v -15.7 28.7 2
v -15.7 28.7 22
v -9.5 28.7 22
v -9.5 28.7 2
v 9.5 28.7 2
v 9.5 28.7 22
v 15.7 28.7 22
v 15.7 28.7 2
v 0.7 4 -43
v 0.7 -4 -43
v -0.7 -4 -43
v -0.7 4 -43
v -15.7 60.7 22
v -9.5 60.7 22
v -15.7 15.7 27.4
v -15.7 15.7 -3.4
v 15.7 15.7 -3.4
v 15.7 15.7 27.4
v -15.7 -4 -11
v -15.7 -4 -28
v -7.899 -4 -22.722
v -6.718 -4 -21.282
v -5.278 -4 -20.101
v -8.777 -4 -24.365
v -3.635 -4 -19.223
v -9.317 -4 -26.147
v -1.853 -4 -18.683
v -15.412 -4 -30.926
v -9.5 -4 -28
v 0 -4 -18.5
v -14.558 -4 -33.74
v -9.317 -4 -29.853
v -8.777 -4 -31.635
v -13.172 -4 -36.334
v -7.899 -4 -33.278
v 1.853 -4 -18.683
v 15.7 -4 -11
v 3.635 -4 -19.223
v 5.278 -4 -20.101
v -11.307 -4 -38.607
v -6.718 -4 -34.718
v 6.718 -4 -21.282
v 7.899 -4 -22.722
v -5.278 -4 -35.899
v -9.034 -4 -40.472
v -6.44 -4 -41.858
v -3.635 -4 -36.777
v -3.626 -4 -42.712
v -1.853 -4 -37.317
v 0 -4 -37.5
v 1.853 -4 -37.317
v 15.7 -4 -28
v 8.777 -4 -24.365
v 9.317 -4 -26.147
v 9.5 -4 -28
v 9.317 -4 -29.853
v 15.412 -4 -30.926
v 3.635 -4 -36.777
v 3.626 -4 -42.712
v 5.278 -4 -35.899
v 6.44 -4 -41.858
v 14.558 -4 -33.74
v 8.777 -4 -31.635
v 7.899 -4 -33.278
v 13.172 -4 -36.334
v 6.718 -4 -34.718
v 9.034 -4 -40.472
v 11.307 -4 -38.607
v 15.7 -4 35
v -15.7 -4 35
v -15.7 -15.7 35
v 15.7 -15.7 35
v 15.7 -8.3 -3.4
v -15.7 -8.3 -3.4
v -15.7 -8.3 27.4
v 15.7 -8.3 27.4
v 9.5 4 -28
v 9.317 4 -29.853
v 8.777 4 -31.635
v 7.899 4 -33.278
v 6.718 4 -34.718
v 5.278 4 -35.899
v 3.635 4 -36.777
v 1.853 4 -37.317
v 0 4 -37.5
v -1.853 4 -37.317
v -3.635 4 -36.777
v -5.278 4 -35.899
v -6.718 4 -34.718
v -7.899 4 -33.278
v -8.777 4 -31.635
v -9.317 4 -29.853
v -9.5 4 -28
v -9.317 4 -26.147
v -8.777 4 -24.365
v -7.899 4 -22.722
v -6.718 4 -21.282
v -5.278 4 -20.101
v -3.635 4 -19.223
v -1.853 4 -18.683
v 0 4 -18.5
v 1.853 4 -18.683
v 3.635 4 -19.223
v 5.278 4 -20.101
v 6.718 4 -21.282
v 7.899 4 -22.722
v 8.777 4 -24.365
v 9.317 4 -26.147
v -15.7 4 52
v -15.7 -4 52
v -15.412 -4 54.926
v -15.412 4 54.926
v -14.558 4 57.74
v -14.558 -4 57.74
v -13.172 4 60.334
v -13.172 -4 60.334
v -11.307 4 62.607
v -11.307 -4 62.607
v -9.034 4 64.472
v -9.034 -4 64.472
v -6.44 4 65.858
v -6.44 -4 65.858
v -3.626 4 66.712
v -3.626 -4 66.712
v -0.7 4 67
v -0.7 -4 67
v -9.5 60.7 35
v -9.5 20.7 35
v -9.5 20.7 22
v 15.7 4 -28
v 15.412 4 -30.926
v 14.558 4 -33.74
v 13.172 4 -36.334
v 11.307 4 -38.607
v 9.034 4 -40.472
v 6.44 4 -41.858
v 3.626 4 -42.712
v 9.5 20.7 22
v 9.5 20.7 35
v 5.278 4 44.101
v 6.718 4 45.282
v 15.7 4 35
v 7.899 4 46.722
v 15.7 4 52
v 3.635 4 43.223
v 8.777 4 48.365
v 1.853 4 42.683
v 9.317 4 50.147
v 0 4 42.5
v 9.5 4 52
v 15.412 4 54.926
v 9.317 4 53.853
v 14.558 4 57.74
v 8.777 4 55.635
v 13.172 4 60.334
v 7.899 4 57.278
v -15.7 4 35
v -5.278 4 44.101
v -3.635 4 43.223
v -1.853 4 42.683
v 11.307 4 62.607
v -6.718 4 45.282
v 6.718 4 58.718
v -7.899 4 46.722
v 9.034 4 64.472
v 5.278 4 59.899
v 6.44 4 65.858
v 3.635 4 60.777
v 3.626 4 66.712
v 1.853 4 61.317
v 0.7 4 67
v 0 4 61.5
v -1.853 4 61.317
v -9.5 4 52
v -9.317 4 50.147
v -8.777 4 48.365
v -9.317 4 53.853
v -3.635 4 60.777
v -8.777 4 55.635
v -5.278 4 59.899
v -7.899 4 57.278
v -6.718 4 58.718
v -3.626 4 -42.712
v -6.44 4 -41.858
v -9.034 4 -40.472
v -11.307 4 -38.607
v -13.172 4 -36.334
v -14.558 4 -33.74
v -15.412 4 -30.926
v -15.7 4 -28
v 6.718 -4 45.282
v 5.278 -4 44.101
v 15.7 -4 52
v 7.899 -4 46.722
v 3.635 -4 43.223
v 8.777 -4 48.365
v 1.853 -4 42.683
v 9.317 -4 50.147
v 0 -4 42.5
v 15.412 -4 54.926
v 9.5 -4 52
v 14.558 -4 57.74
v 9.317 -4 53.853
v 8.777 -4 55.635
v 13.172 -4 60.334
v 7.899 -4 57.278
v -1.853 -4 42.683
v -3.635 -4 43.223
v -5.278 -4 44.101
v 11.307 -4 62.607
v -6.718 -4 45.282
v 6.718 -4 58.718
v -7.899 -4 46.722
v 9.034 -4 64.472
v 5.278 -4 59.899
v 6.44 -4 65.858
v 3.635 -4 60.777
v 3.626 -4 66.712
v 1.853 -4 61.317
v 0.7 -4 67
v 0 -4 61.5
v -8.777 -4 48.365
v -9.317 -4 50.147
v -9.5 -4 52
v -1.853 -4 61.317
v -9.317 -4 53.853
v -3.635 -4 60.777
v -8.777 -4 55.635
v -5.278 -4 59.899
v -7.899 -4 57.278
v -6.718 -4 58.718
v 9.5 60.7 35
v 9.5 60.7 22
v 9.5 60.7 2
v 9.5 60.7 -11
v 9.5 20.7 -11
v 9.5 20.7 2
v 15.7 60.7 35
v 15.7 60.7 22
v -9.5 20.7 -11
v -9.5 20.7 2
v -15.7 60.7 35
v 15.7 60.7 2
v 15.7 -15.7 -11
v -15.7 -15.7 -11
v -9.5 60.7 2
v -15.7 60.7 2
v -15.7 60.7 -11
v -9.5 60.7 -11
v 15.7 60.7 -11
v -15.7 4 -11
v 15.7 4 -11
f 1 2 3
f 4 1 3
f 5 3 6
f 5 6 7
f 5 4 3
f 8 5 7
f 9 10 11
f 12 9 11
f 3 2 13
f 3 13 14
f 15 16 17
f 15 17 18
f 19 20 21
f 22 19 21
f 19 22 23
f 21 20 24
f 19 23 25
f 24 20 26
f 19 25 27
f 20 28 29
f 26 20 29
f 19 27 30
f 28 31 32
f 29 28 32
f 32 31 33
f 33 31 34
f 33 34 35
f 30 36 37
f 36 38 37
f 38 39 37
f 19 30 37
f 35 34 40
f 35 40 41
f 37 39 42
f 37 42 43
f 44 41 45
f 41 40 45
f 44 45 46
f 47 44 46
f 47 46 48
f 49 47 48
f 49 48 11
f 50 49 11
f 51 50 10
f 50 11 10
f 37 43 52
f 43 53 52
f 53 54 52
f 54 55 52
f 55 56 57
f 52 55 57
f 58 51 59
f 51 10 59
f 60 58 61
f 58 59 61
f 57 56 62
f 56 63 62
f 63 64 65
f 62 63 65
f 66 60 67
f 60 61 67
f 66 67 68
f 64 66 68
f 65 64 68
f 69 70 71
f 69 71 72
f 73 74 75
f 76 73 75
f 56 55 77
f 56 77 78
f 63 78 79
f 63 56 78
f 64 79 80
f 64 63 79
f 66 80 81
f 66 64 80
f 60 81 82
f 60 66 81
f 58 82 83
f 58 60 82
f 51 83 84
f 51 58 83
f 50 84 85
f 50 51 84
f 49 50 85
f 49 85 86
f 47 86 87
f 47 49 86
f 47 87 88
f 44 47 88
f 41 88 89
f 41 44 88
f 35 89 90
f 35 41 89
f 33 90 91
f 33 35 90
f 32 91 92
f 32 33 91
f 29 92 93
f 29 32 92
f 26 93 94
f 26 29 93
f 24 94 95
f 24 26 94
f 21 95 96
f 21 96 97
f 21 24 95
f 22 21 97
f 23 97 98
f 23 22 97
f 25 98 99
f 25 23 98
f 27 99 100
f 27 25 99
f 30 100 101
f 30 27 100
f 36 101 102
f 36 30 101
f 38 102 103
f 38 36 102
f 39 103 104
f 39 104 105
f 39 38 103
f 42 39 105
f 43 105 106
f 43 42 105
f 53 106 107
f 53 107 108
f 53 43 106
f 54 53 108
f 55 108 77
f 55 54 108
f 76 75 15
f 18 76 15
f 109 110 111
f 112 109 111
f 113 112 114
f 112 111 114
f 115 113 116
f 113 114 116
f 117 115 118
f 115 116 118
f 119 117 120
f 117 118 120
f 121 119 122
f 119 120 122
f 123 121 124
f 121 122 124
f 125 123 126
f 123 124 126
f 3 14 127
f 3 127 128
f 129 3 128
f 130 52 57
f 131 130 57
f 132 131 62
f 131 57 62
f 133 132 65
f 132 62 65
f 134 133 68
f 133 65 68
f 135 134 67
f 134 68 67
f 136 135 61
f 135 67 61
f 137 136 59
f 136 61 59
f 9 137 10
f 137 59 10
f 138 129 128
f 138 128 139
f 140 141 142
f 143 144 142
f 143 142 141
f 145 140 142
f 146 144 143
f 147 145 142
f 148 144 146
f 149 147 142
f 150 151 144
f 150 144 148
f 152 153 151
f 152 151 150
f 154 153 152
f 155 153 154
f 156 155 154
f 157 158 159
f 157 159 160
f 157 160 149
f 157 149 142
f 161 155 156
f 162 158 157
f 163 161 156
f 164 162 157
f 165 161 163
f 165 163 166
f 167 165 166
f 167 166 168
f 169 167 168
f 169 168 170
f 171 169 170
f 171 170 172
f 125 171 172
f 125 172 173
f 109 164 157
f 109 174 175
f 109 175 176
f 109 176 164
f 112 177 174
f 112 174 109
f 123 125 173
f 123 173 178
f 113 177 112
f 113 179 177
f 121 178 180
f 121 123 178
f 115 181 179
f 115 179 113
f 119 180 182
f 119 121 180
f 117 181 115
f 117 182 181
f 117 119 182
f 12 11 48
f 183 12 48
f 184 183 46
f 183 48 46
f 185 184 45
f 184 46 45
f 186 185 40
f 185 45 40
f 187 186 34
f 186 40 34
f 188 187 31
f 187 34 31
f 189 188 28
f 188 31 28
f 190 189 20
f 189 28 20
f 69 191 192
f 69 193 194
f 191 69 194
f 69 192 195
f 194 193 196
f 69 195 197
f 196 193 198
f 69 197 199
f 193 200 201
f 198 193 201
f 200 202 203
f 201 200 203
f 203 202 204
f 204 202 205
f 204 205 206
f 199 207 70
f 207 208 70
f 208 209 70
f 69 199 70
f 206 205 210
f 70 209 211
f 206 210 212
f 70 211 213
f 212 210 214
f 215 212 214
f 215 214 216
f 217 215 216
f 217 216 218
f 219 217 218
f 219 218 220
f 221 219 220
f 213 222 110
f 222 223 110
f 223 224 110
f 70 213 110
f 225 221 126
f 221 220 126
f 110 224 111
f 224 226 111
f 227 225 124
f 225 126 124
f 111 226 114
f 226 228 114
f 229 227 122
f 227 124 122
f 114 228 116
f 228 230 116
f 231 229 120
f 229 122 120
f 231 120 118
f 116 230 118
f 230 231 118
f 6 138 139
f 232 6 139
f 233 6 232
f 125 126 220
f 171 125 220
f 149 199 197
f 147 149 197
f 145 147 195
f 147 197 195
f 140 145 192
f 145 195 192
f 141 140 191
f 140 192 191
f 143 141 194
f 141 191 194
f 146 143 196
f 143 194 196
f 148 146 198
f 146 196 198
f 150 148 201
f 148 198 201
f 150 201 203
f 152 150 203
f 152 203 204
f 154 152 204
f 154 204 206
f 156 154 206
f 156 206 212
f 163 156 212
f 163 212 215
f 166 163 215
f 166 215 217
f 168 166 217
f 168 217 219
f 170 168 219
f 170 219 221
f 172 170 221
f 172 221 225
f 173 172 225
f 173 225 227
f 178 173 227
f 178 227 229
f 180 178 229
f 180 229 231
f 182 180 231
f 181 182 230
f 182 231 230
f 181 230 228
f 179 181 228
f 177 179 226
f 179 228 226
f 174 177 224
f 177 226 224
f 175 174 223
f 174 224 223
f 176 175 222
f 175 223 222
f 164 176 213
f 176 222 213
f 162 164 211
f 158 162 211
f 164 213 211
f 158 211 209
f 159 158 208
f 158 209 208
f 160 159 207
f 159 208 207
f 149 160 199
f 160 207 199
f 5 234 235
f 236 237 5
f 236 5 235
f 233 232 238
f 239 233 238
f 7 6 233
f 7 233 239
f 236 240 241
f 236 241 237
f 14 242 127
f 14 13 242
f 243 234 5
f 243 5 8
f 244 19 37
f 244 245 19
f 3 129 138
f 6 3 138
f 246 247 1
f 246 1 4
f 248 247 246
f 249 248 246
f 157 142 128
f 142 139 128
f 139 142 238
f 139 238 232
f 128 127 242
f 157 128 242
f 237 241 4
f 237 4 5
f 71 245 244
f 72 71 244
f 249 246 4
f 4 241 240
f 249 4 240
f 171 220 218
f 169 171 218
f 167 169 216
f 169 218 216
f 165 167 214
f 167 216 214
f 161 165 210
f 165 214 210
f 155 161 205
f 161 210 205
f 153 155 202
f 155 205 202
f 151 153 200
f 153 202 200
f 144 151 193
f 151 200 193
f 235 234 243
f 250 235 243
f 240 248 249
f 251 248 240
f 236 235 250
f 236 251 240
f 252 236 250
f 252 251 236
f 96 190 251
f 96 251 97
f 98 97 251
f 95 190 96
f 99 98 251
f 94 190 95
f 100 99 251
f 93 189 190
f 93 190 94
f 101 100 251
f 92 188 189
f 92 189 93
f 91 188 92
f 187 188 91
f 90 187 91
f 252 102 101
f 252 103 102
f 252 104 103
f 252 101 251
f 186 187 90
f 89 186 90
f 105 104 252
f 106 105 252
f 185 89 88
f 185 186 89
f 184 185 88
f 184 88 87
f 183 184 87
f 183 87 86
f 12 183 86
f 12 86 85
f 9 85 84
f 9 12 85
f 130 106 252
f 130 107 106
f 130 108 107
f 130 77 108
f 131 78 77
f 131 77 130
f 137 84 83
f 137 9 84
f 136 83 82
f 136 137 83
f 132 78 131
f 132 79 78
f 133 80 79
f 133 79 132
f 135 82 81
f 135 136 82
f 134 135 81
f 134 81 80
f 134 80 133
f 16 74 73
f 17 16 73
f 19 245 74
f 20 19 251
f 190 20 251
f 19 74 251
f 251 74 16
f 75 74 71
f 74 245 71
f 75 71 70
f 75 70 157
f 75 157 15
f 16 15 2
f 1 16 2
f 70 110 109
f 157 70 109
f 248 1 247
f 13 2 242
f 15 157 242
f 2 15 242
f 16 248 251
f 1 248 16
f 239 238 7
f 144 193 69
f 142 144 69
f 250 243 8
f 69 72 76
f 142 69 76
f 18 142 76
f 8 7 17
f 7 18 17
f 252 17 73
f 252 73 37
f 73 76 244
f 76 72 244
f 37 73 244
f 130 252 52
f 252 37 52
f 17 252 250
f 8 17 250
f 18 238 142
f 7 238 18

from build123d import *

# Parameters (mm, degrees)
SKETCH4_W             = 31.4
SKETCH4_H             = 31.4
SKETCH4_W_2           = 25.4
SKETCH4_H_2           = 25.4
BOSS_EXTRUDE3_DEPTH   = 30
SKETCH5_W             = 31.4
SKETCH5_H             = 31.4
BOSS_EXTRUDE4_DEPTH   = 5
SKETCH6_W             = 31.4
SKETCH6_H             = 8
BOSS_EXTRUDE5_DEPTH   = 5
BOSS_EXTRUDE6_DEPTH   = 8
SKETCH8_R             = 9.5
BOSS_EXTRUDE7_DEPTH   = 8
SKETCH9_W             = 31.4
SKETCH9_H             = 10
BOSS_EXTRUDE8_DEPTH   = 5
SKETCH10_W            = 31.4
SKETCH10_H            = 10
BOSS_EXTRUDE9_DEPTH   = 13
SKETCH11_W            = 6.2
SKETCH11_H            = 10
BOSS_EXTRUDE10_DEPTH  = 40
BOSS_EXTRUDE11_DEPTH  = 3
SKETCH13_W            = 31.4
SKETCH13_H            = 31.4
CUT_EXTRUDE1_DEPTH    = 31.4
SKETCH14_W            = 31.4
SKETCH14_H            = 31.4
BOSS_EXTRUDE12_DEPTH  = 4
SKETCH16_W            = 31.4
SKETCH16_H            = 8
BOSS_EXTRUDE13_DEPTH  = 15.4
CUT_EXTRUDE3_START    = 8
SKETCH8_2_R           = 9.5
CUT_EXTRUDE3_DEPTH    = 24
MIRROR2_START         = -15.7
MIRROR2_DEPTH         = 36.4
MIRROR2_START_2       = 12.7
MIRROR2_2_OUTLINE_W   = 6.2
MIRROR2_2_OUTLINE_H   = 13
MIRROR2_2_DEPTH       = 48
MIRROR2_START_3       = -4
MIRROR2_3_OUTLINE_R   = 9.5
MIRROR2_3_DEPTH       = 8
MIRROR2_4_OUTLINE_W   = 31.4
MIRROR2_4_OUTLINE_H   = 10
MIRROR2_4_DEPTH       = 16
MIRROR2_5_OUTLINE_W   = 25.4
MIRROR2_5_OUTLINE_H   = 15.4
MIRROR2_5_DEPTH       = 8
MIRROR2_6_OUTLINE_W   = 25.4
MIRROR2_6_OUTLINE_H   = 12
MIRROR2_6_OUTLINE_W_2 = 19
MIRROR2_6_OUTLINE_H_2 = 5.4
MIRROR2_6_DEPTH       = 8
SKETCH17_W            = 30.8
SKETCH17_H            = 24
CUT_EXTRUDE2_DEPTH    = 31.4


# Read off the part's stored shape, not the designer's step: Mirror2
with BuildPart() as part:
    # Sketch4 → Boss-Extrude3 (new body)
    with BuildSketch(Plane.XY):
        Rectangle(SKETCH4_W, SKETCH4_H)
        Rectangle(SKETCH4_W_2, SKETCH4_H_2, mode=Mode.SUBTRACT)
    extrude(amount=BOSS_EXTRUDE3_DEPTH)

    # Sketch5 → Boss-Extrude4 (add)
    with BuildSketch(Plane.XY.offset(30)):
        Rectangle(SKETCH5_W, SKETCH5_H)
    extrude(amount=BOSS_EXTRUDE4_DEPTH)

    # Sketch6 → Boss-Extrude5 (add)
    with BuildSketch(Plane.XY.offset(35)):
        Rectangle(SKETCH6_W, SKETCH6_H)
    extrude(amount=BOSS_EXTRUDE5_DEPTH)

    # Sketch7 → Boss-Extrude6 (add)
    with BuildSketch(Plane.XZ.offset(4)):
        with BuildLine():
            Line((-15.7, 40), (-15.7, 52))
            ThreePointArc((-15.7, 52), (-11.306601718, 62.606601718), (-0.7, 67))
            Line((-0.7, 67), (0.7, 67))
            ThreePointArc((0.7, 67), (11.306601718, 62.606601718), (15.7, 52))
            Line((15.7, 52), (15.7, 40))
            Line((15.7, 40), (-15.7, 40))
        make_face()
    extrude(amount=-BOSS_EXTRUDE6_DEPTH)

    # Sketch8 → Boss-Extrude7 (add)
    with BuildSketch(Plane.XZ.offset(4)):
        with Locations(Location((0, 52, 0), (0, 0, 180))):
            Circle(SKETCH8_R)
    boss_extrude7 = extrude(amount=BOSS_EXTRUDE7_DEPTH)

    # Mirror1: Boss-Extrude7 across plane
    add(boss_extrude7.mirror(Plane.ZX))

    # Sketch9 → Boss-Extrude8 (add)
    with BuildSketch(Plane(origin=(0, 15.7, 0), x_dir=(1, 0, 0), z_dir=(0, 1, 0))):
        with Locations((0, -27)):
            Rectangle(SKETCH9_W, SKETCH9_H)
    extrude(amount=BOSS_EXTRUDE8_DEPTH)

    # Sketch10 → Boss-Extrude9 (add)
    with BuildSketch(Plane(origin=(0, 15.7, 0), x_dir=(1, 0, 0), z_dir=(0, 1, 0))):
        with Locations((0, -17)):
            Rectangle(SKETCH10_W, SKETCH10_H)
    extrude(amount=BOSS_EXTRUDE9_DEPTH)

    # Sketch11 → Boss-Extrude10 (add)
    with BuildSketch(Plane(origin=(0, 20.7, 0), x_dir=(1, 0, 0), z_dir=(0, 1, 0))):
        with Locations((-12.6, -27)):
            Rectangle(SKETCH11_W, SKETCH11_H)
        with Locations((12.6, -27)):
            Rectangle(SKETCH11_W, SKETCH11_H)
    extrude(amount=BOSS_EXTRUDE10_DEPTH)

    # Sketch12 → Boss-Extrude11 (add)
    with BuildSketch(Plane.XY.offset(32)):
        Polygon((-15.7, 60.7), (-9.5, 60.7), (-9.5, 20.7), (9.5, 20.7), (9.5, 60.7), (15.7, 60.7), (15.7, 15.7), (-15.7, 15.7), align=None)
    extrude(amount=BOSS_EXTRUDE11_DEPTH)

    # Sketch13 → Cut-Extrude1 (cut)
    with BuildSketch(Plane.ZY.offset(15.7)):
        with Locations((15.7, 0)):
            Rectangle(SKETCH13_W, SKETCH13_H)
    extrude(amount=-CUT_EXTRUDE1_DEPTH, mode=Mode.SUBTRACT)

    # Sketch14 → Boss-Extrude12 (add)
    with BuildSketch(Plane(origin=(0, 0, 31.4), x_dir=(-1, 0, 0), z_dir=(0, 0, -1))):
        Rectangle(SKETCH14_W, SKETCH14_H)
    extrude(amount=BOSS_EXTRUDE12_DEPTH)

    # Sketch16 → Boss-Extrude13 (add)
    with BuildSketch(Plane(origin=(0, 0, 27.4), x_dir=(-1, 0, 0), z_dir=(0, 0, -1))):
        with Locations((0, -11.7)):
            Rectangle(SKETCH16_W, SKETCH16_H)
    extrude(amount=BOSS_EXTRUDE13_DEPTH)

    # Sketch8<2> → Cut-Extrude3 (cut)
    with BuildSketch(Plane.XZ.offset(4).offset(CUT_EXTRUDE3_START)):
        with Locations(Location((0, 52, 0), (0, 0, 270))):
            Circle(SKETCH8_2_R)
    extrude(amount=-CUT_EXTRUDE3_DEPTH, mode=Mode.SUBTRACT)

    # Mirror2 outline → Mirror2 (add)
    with BuildSketch(Plane(origin=(0, 0, 0), x_dir=(1, 0, 0), z_dir=(0, 1, 0)).offset(MIRROR2_START)):
        Polygon((12.7, -24), (15.7, -24), (15.7, 11), (-15.7, 11), (-15.7, -24), (-12.7, -24), (-12.7, 3.4), (12.7, 3.4), align=None)
    extrude(amount=MIRROR2_DEPTH)

    # Mirror2 2 outline → Mirror2 2 (add)
    with BuildSketch(Plane(origin=(0, 0, 0), x_dir=(1, 0, 0), z_dir=(0, 1, 0)).offset(MIRROR2_START_2)):
        with Locations((12.6, 4.5)):
            Rectangle(MIRROR2_2_OUTLINE_W, MIRROR2_2_OUTLINE_H)
        with Locations((-12.6, 4.5)):
            Rectangle(MIRROR2_2_OUTLINE_W, MIRROR2_2_OUTLINE_H)
    extrude(amount=MIRROR2_2_DEPTH)

    # Mirror2 3 outline → Mirror2 3 (add)
    with BuildSketch(Plane(origin=(0, 0, 0), x_dir=(1, 0, 0), z_dir=(0, 1, 0)).offset(MIRROR2_START_3)):
        with BuildLine():
            Line((-15.7, 11), (15.7, 11))
            Line((15.7, 11), (15.7, 28))
            ThreePointArc((15.7, 28), (11.306601718, 38.606601718), (0.7, 43))
            Line((0.7, 43), (-0.7, 43))
            ThreePointArc((-0.7, 43), (-11.306601718, 38.606601718), (-15.7, 28))
            Line((-15.7, 28), (-15.7, 11))
        make_face()
        with Locations((0, 28)):
            Circle(MIRROR2_3_OUTLINE_R, mode=Mode.SUBTRACT)
    extrude(amount=MIRROR2_3_DEPTH)

    # Mirror2 4 outline → Mirror2 4 (add)
    with BuildSketch(Plane(origin=(0, 0, 0), x_dir=(1, 0, 0), z_dir=(0, 1, 0)).offset(MIRROR2_START_2)):
        with Locations((0, -7)):
            Rectangle(MIRROR2_4_OUTLINE_W, MIRROR2_4_OUTLINE_H)
    extrude(amount=MIRROR2_4_DEPTH)

    # Mirror2 5 outline → Mirror2 5 (add)
    with BuildSketch(Plane(origin=(0, 0, 0), x_dir=(1, 0, 0), z_dir=(0, 1, 0)).offset(MIRROR2_START)):
        with Locations((0, -4.3)):
            Rectangle(MIRROR2_5_OUTLINE_W, MIRROR2_5_OUTLINE_H)
    extrude(amount=MIRROR2_5_DEPTH)

    # Mirror2 6 outline → Mirror2 6 (add)
    with BuildSketch(Plane(origin=(0, 0, 0), x_dir=(1, 0, 0), z_dir=(0, 1, 0)).offset(MIRROR2_START_2)):
        with Locations((0, -18)):
            Rectangle(MIRROR2_6_OUTLINE_W, MIRROR2_6_OUTLINE_H)
        with Locations((0, 0.7)):
            Rectangle(MIRROR2_6_OUTLINE_W_2, MIRROR2_6_OUTLINE_H_2)
    extrude(amount=MIRROR2_6_DEPTH)

    # Sketch17 → Cut-Extrude2 (cut)
    with BuildSketch(Plane.ZY.offset(15.7)):
        with Locations((12, 3.7)):
            Rectangle(SKETCH17_W, SKETCH17_H)
    extrude(amount=-CUT_EXTRUDE2_DEPTH, mode=Mode.SUBTRACT)


solid = part.part
